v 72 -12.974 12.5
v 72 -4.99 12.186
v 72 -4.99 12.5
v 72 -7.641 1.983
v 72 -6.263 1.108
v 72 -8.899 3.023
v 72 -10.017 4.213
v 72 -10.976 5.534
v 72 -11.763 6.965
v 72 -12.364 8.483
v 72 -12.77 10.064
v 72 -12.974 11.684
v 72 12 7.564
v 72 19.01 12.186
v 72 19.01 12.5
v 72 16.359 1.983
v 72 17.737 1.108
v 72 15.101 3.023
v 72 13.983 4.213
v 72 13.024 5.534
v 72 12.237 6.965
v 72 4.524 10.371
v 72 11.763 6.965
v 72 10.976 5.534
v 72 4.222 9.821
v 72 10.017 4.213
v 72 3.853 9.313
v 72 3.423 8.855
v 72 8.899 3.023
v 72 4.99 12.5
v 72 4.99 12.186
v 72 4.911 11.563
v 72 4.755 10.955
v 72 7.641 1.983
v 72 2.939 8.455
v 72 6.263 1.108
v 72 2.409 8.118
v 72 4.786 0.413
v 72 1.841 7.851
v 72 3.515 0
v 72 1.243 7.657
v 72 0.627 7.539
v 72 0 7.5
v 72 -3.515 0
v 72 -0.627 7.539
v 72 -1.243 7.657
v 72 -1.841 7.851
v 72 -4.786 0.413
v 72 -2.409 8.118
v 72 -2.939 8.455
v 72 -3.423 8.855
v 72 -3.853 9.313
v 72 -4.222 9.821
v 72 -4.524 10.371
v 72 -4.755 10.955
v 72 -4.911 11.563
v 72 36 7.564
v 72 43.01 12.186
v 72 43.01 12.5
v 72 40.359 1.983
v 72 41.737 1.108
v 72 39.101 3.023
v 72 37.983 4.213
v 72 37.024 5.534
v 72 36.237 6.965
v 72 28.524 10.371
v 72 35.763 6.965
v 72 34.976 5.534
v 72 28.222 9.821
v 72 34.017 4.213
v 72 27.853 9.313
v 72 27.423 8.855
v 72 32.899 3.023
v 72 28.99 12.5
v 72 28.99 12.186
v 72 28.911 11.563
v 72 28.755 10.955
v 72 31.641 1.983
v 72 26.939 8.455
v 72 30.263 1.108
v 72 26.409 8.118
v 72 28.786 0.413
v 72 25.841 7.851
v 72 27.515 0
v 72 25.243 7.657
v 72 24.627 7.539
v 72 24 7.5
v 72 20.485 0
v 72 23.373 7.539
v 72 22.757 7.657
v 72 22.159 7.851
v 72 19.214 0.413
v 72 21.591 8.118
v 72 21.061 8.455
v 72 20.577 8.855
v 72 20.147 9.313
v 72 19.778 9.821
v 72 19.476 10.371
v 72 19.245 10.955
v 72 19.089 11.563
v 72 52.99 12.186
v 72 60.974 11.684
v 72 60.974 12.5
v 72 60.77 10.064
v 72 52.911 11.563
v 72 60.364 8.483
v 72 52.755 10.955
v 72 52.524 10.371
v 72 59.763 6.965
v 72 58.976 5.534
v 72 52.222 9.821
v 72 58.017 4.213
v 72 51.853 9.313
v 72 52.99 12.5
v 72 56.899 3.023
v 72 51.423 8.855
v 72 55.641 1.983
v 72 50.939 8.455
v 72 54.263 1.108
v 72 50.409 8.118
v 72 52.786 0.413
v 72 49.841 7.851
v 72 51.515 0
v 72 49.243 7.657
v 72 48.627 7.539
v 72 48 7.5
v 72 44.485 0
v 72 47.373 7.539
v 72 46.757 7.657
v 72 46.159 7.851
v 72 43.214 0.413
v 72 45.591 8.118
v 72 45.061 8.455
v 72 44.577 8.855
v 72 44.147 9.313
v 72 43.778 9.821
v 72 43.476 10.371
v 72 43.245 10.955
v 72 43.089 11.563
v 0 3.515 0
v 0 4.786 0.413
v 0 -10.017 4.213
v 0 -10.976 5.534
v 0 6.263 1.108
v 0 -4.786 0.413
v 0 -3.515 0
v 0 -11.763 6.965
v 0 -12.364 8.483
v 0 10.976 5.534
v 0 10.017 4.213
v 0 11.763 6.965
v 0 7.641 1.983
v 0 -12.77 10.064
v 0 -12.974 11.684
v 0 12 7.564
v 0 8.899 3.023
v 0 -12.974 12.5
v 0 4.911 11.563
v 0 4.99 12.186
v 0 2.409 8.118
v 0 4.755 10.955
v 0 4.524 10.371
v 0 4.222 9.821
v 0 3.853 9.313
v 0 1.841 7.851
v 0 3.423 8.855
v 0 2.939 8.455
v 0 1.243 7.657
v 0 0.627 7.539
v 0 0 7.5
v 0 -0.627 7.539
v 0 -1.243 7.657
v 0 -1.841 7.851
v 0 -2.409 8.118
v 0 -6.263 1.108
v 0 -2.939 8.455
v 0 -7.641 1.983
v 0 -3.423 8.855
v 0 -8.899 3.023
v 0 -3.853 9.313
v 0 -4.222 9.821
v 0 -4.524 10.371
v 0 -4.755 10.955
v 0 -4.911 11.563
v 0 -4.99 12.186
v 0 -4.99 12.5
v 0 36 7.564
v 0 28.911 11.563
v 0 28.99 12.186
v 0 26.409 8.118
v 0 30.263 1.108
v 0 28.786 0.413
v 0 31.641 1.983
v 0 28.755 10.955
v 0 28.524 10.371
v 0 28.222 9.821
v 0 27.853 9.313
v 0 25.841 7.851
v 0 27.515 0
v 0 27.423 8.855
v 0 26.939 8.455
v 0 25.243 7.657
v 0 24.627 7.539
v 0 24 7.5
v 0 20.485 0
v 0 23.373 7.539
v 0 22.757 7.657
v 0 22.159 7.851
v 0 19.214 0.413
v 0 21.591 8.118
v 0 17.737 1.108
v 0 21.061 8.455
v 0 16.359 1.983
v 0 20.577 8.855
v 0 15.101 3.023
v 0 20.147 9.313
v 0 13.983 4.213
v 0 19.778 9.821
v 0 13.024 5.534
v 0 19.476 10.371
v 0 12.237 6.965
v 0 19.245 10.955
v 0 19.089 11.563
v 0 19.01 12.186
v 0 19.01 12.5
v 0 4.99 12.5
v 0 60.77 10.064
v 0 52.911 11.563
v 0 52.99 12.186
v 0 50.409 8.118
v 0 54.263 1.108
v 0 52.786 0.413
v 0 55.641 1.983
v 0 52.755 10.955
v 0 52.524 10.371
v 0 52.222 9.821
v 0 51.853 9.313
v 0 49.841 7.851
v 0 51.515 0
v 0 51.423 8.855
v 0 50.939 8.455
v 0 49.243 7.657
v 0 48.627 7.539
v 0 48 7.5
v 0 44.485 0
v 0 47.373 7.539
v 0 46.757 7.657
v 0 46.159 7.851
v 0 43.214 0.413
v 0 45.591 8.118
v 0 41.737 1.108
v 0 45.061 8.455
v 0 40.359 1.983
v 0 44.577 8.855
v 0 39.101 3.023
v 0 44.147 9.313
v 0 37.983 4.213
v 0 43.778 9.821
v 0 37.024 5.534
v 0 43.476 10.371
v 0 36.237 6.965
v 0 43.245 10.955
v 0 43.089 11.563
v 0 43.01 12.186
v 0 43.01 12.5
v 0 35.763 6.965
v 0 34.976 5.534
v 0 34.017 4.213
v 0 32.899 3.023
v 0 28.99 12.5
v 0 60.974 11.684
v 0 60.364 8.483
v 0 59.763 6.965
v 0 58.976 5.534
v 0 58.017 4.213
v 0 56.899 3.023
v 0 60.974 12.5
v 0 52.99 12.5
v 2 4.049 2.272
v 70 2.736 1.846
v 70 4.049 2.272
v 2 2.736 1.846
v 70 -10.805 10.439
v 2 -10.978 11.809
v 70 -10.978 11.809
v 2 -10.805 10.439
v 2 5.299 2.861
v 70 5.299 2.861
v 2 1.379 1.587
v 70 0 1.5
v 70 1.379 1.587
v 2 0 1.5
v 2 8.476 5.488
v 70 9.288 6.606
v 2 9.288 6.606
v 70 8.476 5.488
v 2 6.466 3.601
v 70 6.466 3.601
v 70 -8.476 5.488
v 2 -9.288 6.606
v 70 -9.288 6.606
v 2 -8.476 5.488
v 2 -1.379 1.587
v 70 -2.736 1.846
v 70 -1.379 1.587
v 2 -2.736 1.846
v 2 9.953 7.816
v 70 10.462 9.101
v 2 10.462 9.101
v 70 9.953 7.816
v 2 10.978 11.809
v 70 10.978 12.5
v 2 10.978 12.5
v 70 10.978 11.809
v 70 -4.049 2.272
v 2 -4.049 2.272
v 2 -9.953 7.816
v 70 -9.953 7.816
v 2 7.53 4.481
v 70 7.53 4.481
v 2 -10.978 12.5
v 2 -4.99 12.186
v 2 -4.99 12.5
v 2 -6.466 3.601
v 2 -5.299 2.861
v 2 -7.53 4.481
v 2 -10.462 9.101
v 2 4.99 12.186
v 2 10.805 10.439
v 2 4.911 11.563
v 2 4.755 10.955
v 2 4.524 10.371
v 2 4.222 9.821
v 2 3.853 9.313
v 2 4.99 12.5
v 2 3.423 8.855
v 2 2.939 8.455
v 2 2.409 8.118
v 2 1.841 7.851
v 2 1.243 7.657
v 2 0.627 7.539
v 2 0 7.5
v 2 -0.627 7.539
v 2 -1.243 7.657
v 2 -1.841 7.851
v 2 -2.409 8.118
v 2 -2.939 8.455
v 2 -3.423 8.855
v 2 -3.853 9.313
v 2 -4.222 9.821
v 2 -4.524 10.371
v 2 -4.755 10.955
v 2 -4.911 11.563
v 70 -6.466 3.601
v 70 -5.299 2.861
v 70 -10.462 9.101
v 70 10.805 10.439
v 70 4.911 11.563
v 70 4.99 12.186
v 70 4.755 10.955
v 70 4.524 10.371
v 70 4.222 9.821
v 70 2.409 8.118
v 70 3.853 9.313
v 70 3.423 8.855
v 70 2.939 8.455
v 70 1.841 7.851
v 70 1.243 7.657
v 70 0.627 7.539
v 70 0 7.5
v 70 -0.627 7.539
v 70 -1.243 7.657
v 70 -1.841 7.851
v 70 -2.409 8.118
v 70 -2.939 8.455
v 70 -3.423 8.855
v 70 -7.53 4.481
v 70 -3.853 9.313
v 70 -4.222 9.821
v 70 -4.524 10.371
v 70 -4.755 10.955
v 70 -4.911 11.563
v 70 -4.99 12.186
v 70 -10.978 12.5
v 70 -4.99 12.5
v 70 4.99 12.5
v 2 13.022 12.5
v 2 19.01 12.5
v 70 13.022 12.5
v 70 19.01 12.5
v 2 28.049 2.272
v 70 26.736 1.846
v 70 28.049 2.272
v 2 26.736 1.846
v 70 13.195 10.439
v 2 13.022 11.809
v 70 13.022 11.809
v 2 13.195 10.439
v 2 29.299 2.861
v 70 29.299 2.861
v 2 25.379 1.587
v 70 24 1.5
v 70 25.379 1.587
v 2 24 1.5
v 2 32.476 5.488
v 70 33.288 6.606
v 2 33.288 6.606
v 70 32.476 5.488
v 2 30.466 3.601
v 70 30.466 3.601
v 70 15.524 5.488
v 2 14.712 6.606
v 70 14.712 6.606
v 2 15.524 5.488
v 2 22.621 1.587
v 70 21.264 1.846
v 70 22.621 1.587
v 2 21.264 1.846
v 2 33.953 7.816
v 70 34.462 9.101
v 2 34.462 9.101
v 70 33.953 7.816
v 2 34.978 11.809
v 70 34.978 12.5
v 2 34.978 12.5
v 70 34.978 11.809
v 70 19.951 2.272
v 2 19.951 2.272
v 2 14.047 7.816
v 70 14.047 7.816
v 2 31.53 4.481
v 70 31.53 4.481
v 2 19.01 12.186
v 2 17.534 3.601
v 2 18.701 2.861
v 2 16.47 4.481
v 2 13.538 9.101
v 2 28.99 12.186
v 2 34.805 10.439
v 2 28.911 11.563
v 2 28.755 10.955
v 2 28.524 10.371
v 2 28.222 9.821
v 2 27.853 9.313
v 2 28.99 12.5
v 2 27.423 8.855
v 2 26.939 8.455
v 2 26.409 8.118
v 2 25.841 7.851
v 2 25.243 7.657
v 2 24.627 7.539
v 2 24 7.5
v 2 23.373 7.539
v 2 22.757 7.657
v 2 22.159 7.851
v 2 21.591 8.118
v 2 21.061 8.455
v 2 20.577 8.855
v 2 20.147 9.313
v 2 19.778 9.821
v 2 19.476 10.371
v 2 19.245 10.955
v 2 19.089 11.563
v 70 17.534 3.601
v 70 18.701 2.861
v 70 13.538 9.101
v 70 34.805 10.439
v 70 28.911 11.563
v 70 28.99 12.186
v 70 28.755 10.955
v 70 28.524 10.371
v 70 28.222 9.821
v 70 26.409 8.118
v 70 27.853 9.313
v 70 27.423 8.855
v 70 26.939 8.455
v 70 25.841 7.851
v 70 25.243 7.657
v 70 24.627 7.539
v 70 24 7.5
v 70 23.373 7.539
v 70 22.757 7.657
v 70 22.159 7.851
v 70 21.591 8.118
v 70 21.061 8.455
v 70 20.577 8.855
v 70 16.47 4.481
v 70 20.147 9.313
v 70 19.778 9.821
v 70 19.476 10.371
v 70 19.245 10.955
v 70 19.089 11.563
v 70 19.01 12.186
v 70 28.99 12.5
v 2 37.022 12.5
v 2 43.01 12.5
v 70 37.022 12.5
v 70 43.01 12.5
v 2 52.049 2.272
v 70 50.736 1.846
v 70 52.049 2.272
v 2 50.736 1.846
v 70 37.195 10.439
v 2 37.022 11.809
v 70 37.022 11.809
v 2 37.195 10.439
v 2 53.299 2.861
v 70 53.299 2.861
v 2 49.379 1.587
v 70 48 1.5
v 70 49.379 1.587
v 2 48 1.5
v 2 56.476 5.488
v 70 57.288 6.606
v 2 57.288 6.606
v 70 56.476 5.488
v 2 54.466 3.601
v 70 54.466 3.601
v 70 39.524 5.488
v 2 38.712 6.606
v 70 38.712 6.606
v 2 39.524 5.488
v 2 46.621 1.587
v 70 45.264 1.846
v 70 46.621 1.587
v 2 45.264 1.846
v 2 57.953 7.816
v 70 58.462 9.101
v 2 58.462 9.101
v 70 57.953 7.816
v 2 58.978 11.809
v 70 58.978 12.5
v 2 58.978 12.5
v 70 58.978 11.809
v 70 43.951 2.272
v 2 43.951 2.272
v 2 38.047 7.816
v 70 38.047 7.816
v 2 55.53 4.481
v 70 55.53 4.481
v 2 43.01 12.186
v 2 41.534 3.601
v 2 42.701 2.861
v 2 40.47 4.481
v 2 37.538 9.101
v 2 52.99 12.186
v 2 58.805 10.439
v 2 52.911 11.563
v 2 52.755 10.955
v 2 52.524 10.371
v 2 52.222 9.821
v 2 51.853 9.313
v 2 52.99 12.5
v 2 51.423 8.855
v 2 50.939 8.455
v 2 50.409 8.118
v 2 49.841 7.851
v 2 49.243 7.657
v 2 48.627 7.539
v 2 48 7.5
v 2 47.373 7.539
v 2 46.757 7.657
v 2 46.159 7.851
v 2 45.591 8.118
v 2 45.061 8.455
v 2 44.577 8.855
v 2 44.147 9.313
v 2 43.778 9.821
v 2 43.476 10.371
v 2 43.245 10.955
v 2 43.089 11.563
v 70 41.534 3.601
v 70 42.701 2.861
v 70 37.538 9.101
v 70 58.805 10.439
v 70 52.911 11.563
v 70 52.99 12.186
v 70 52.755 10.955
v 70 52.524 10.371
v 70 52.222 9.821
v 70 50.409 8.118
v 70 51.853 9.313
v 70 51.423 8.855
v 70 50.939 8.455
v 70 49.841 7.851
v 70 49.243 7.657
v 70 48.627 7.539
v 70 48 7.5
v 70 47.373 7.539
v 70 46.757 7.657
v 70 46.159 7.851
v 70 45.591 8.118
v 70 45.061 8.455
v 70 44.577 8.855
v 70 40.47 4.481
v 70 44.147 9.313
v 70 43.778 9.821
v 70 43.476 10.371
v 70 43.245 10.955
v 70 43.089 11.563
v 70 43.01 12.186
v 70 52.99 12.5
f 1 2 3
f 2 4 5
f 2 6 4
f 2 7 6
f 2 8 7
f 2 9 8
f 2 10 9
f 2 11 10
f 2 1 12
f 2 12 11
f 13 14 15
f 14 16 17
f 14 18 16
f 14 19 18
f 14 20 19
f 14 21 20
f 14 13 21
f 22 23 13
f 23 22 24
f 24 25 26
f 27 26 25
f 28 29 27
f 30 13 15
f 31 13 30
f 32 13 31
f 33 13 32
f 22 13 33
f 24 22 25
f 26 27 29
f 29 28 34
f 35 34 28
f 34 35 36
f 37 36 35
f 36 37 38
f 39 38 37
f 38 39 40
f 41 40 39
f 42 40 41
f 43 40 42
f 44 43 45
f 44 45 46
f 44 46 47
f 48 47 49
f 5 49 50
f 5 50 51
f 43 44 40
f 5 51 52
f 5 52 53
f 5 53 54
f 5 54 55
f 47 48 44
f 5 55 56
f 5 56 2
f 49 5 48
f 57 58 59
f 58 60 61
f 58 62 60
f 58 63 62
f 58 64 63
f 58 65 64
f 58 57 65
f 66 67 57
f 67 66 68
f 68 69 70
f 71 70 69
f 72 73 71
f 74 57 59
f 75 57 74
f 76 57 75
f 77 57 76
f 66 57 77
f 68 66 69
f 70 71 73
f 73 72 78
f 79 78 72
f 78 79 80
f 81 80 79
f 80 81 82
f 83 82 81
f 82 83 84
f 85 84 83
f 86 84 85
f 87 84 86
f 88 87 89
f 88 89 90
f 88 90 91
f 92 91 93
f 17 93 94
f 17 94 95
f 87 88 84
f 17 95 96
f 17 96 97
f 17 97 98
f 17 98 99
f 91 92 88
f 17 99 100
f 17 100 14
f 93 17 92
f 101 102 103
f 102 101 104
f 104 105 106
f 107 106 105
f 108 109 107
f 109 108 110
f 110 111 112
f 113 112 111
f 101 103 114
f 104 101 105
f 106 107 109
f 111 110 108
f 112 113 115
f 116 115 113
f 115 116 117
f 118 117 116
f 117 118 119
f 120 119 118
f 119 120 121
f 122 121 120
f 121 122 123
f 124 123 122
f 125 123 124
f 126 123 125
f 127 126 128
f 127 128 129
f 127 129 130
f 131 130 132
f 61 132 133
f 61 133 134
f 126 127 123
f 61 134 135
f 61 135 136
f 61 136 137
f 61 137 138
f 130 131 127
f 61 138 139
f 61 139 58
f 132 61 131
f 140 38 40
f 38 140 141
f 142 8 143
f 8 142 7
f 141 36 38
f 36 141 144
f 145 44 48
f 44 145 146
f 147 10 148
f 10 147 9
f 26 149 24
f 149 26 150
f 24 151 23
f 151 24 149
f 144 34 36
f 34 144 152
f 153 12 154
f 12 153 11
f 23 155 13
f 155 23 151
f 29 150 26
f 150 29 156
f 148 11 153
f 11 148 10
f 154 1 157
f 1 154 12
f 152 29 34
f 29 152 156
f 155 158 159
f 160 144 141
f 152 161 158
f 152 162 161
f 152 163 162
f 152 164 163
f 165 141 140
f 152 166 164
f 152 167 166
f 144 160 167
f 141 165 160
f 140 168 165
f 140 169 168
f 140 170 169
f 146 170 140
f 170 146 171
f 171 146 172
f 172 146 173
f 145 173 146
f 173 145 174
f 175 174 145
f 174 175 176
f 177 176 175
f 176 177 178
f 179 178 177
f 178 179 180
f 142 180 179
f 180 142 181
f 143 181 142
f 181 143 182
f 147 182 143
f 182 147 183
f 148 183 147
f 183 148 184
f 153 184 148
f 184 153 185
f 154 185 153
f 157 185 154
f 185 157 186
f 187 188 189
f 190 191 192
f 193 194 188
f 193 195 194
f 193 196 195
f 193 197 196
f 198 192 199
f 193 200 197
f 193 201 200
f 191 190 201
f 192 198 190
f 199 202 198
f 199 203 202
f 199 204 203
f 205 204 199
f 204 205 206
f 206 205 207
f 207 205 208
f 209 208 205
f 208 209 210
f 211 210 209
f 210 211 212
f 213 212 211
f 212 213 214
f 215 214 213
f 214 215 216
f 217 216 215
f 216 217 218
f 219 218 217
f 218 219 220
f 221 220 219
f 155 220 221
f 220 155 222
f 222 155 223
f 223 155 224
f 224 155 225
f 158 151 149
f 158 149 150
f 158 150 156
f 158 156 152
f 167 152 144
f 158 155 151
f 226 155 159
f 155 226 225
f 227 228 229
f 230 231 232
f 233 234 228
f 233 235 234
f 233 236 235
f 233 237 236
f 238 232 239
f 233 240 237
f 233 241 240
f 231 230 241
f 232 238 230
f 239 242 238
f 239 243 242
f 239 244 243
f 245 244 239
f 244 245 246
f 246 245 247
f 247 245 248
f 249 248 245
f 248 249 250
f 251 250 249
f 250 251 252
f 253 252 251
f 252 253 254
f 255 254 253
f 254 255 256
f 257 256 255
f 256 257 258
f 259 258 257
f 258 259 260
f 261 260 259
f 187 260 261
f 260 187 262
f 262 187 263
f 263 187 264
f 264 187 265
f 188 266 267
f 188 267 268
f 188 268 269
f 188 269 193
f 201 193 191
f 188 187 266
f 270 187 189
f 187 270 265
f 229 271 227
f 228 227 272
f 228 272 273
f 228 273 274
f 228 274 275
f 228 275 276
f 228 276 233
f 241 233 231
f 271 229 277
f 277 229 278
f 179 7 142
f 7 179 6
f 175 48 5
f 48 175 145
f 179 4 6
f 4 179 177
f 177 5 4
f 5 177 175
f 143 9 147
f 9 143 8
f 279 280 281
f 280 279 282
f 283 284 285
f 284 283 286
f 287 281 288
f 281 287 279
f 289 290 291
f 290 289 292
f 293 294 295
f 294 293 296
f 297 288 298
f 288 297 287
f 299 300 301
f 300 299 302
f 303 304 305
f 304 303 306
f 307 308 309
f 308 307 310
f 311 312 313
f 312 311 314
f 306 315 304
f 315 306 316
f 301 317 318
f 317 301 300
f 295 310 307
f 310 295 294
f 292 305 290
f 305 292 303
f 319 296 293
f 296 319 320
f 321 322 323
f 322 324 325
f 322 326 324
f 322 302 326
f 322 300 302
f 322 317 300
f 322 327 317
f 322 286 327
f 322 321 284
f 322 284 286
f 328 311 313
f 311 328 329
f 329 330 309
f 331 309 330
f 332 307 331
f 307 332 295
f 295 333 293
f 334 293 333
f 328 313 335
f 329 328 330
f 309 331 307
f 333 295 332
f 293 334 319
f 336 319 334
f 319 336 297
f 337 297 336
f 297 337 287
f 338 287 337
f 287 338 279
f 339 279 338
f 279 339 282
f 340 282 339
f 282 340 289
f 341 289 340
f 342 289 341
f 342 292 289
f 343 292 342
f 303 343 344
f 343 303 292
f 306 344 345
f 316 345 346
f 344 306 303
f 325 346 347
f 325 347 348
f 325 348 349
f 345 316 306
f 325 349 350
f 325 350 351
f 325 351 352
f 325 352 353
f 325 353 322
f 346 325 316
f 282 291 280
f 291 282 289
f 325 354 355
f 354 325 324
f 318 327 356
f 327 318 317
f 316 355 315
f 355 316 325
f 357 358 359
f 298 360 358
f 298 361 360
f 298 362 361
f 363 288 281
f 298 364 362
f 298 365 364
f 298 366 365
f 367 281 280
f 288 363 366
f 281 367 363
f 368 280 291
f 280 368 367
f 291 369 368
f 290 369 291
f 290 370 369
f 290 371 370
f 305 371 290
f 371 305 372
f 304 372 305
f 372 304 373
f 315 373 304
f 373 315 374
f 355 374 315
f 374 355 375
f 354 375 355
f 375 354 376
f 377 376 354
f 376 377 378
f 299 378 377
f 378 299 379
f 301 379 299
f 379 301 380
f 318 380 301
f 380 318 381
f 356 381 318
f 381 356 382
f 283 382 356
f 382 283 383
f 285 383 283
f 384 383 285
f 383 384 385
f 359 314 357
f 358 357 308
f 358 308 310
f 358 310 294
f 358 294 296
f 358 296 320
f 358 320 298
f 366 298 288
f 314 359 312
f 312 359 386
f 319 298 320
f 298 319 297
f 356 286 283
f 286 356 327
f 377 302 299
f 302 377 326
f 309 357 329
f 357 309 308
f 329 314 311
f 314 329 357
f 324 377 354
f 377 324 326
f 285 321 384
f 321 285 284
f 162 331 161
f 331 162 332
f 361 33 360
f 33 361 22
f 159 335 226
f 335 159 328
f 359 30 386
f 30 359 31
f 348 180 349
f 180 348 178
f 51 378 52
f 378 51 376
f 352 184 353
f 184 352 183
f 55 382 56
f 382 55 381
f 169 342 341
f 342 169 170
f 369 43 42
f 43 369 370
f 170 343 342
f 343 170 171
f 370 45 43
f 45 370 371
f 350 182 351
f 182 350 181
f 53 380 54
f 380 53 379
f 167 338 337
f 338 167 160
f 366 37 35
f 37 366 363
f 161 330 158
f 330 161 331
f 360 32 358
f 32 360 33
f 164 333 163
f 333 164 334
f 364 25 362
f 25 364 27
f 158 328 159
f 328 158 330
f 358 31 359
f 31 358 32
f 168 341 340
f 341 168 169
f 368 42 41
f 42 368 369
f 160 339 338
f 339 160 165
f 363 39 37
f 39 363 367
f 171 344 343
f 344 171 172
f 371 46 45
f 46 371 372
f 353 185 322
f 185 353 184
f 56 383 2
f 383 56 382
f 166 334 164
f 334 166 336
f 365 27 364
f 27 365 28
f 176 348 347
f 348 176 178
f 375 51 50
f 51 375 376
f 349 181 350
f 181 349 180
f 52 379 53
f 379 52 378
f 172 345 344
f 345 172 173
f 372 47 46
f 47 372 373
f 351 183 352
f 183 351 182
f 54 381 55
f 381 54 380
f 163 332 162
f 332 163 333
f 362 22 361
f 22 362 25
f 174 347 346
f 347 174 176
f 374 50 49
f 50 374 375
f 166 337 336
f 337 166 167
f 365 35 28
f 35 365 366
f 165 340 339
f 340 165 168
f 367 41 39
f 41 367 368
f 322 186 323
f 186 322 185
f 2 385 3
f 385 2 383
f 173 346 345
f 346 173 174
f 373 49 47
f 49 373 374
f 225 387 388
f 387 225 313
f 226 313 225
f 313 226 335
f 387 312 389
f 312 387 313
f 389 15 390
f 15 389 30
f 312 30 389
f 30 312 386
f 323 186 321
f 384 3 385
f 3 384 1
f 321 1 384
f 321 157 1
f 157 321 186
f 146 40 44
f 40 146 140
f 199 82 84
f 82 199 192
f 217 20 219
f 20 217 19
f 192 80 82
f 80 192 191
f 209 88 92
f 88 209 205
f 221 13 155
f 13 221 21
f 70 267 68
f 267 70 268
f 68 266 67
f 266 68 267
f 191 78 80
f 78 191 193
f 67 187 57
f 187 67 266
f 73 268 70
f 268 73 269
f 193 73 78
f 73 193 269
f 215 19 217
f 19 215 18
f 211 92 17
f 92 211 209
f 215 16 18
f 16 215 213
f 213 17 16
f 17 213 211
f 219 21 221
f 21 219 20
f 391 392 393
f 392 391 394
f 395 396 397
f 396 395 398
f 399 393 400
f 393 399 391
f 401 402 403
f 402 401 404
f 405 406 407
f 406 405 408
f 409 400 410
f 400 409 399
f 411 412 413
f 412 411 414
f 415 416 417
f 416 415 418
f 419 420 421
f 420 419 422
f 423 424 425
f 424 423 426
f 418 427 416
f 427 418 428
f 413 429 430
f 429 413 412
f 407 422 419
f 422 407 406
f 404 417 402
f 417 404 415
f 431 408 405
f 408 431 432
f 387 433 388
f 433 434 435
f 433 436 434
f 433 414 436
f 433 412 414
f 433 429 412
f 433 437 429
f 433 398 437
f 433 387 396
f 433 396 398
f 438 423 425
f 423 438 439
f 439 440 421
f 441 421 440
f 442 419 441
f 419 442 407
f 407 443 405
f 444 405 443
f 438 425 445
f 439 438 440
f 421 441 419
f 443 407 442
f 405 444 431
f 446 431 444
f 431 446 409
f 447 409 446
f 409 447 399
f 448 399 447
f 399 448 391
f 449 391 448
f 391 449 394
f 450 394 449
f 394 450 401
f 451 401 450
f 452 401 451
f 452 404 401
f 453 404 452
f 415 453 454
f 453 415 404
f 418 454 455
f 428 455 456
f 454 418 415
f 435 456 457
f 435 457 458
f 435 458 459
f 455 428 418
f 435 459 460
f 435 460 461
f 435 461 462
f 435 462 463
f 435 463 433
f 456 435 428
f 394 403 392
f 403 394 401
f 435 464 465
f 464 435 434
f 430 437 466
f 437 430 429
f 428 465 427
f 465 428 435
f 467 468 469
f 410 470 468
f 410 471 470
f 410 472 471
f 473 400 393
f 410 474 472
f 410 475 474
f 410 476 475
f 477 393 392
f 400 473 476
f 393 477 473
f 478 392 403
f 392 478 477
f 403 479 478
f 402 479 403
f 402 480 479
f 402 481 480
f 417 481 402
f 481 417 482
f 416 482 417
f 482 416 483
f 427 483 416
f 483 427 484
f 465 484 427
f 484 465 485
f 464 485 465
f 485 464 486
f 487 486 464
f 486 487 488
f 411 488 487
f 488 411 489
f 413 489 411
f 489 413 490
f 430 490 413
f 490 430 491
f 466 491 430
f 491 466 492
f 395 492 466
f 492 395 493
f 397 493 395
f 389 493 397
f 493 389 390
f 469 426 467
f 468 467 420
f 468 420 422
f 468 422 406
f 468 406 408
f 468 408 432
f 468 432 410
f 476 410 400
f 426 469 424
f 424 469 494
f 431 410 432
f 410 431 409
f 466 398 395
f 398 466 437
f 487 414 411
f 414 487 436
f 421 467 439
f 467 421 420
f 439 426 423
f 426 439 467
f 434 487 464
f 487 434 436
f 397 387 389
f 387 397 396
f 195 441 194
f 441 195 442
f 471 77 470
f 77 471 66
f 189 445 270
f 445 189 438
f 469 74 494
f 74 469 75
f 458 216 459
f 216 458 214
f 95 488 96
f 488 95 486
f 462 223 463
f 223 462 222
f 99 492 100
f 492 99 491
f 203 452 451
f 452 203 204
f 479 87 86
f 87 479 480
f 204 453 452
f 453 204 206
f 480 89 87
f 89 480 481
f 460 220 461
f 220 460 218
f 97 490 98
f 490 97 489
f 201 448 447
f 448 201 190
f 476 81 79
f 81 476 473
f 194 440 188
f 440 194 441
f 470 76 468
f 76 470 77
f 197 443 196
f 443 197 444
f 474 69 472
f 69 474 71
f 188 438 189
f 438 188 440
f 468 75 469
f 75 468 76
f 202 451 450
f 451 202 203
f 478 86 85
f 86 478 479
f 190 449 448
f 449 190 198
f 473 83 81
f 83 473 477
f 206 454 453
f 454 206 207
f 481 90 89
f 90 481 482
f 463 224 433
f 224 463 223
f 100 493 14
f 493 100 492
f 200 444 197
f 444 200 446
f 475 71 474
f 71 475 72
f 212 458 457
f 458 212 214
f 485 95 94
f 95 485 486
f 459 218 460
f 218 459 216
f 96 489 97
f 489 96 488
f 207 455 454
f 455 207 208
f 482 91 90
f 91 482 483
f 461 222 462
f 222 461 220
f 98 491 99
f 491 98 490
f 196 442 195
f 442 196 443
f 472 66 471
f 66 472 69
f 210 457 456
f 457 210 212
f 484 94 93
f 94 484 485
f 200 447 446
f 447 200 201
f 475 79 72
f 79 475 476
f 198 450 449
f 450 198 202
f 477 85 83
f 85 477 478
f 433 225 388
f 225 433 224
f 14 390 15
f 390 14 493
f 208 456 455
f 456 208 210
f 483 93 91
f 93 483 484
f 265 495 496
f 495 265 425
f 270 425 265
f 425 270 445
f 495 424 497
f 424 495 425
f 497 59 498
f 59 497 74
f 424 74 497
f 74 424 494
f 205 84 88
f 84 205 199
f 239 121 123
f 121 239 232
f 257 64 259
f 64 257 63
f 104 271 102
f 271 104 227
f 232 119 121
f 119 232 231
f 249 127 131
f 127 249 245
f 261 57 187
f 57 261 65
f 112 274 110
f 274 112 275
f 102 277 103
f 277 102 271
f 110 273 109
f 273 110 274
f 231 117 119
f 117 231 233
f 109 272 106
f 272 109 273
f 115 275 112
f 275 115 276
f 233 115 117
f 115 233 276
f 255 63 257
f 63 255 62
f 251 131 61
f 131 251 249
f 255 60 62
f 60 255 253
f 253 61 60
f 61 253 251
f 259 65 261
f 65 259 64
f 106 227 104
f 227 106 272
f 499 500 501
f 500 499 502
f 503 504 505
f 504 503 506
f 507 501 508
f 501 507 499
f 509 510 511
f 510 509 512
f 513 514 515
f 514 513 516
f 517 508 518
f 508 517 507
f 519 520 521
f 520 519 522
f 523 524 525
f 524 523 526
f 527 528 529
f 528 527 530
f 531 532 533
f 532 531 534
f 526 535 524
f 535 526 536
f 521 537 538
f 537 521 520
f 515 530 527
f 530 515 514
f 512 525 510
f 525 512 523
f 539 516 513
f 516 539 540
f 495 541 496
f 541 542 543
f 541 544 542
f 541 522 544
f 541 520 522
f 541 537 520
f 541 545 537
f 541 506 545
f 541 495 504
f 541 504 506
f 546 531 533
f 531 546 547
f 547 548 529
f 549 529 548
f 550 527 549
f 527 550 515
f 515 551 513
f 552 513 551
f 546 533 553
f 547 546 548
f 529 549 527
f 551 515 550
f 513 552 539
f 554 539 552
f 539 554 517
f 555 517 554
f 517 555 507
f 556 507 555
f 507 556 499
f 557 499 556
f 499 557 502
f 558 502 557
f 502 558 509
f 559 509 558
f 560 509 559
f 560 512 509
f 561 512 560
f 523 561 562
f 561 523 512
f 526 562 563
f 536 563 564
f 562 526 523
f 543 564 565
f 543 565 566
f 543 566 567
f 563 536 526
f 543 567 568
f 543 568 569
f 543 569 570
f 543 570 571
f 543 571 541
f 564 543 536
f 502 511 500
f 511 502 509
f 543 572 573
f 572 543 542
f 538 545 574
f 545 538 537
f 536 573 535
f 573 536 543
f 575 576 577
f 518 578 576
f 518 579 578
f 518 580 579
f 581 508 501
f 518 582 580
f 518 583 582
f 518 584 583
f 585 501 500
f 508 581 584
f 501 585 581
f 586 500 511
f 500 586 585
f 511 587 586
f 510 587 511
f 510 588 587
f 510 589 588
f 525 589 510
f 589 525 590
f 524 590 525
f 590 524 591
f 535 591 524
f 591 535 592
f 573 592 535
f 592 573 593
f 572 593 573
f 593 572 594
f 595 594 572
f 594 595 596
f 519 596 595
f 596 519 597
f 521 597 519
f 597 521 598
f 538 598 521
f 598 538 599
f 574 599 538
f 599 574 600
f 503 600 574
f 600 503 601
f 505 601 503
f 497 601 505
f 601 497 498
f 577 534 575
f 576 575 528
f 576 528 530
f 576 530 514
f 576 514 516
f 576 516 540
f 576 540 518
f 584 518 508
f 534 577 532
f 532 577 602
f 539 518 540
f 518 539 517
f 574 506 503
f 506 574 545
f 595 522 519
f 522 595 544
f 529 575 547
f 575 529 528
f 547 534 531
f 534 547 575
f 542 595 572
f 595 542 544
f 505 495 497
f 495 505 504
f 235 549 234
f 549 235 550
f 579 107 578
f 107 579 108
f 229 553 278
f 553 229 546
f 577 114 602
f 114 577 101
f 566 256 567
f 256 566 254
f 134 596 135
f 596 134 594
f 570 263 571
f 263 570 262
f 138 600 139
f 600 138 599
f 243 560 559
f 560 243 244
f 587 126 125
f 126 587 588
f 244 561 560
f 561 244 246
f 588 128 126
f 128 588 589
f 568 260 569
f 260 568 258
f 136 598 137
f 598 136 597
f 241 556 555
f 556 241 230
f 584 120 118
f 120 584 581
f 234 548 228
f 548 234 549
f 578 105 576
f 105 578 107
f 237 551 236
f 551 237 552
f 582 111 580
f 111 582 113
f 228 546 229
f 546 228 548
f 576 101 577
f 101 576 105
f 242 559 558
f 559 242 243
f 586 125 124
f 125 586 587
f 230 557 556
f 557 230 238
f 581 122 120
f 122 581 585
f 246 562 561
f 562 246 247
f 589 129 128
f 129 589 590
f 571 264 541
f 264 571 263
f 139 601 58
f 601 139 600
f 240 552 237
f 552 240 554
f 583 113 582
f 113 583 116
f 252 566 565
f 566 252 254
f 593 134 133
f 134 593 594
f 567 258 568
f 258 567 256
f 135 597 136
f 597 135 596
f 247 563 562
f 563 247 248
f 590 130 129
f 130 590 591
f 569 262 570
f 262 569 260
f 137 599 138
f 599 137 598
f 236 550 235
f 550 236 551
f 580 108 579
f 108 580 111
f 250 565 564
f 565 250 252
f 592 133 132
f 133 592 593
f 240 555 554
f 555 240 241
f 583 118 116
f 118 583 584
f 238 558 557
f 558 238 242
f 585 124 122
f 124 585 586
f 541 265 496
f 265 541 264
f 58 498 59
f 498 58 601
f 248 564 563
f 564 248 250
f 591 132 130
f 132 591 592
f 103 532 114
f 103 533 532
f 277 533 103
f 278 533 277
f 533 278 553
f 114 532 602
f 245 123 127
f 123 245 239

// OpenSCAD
// mathgrrl customizable poker chip rack

////////////////////////////////////////////////////////////////////////////
// parameters //////////////////////////////////////////////////////////////

// Diameter of one poker chip (in millimeters)
Chip_Diameter = 20; 

// Thickness of one poker chip (in millimeters)
Chip_Thickness = 3.35; 

// Number of chips you want in each row of the rack
Number_of_Chips = 20;

// Number of rows you want in the rack
Number_of_Rows = 3;

// Thickness of the rack itself
Rack_Thickness = 2; 

// Enter a tolerance (more if your chips are too tight, less if they are too loose)
Fudge = 1;

// Parameters invisible to the user
$fn = 50*1;						
radius = Chip_Diameter/2 + Fudge;
height = Chip_Thickness*Number_of_Chips + Fudge;
thickness = Rack_Thickness*1;
rows = Number_of_Rows*1;
shift = 2*1; 		// to make clean holes and/or holes with edges

////////////////////////////////////////////////////////////////////////////
// renders /////////////////////////////////////////////////////////////////

for (i = [1:1:rows]){
	translate([0,(i-1)*(2*radius+thickness),0]) chipstack();
}

////////////////////////////////////////////////////////////////////////////
// module for holding one stack of chips ///////////////////////////////////

module chipstack(){
	// shift down to platform
	translate([0,0,-.5])
		difference(){
			// outside cylinder
			translate([0,0,radius+thickness]) 
				rotate(90,[0,1,0]) 
					cylinder(h=height+2*thickness,r=radius+thickness);
			// take away chip cylinder
			translate([thickness,0,radius+thickness]) 
				rotate(90,[0,1,0]) 
					cylinder(h=height,r=radius);
			// take away thumb cylinder
			translate([-shift,0,radius+thickness]) 
				rotate(90,[0,1,0]) 
					cylinder(h=height+2*thickness+2*shift,r=radius-3*thickness);
			// take away top
			translate([-shift,-.5*(height+2*shift),radius+thickness])
				cube(height+2*thickness+2*shift);
			// flatten bottom
			translate([-shift,-5,-10+.5])
				cube([height+2*thickness+2*shift,10,10]);
		}
}
